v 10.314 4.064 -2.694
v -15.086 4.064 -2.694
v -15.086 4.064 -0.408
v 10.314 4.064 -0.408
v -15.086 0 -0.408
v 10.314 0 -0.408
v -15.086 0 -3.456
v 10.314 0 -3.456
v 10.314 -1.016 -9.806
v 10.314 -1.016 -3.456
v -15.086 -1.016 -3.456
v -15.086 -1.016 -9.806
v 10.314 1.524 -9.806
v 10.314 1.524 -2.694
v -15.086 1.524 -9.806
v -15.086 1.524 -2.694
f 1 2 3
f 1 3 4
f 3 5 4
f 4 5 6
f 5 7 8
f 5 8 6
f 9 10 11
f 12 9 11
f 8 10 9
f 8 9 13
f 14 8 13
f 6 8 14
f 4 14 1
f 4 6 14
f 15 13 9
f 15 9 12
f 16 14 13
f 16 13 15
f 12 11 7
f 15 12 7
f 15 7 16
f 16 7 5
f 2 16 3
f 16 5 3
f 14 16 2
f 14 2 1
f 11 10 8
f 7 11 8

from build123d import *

# Parameters (mm, degrees)
SKETCH1_W           = 25.4
SKETCH1_H           = 2.286
BOSS_EXTRUDE1_DEPTH = 4.064
SKETCH3_W           = 25.4
SKETCH3_H           = 2.54
BOSS_EXTRUDE3_DEPTH = 7.112
SKETCH4_W           = 0.762
SKETCH4_H           = 1.016
CUT_EXTRUDE1_DEPTH  = 30.734


with BuildPart() as part:
    # Sketch1 → Boss-Extrude1 (new body)
    with BuildSketch(Plane(origin=(0, 0, 0), x_dir=(1, 0, 0), z_dir=(0, 1, 0))):
        with Locations((-2.386060606, 1.550939394)):
            Rectangle(SKETCH1_W, SKETCH1_H)
    extrude(amount=BOSS_EXTRUDE1_DEPTH)

    # Sketch3 → Boss-Extrude3 (add)
    with BuildSketch(Plane(origin=(0, 0, -2.693939394), x_dir=(-1, 0, 0), z_dir=(0, 0, -1))):
        with Locations((2.386060606, 0.254)):
            Rectangle(SKETCH3_W, SKETCH3_H)
    extrude(amount=BOSS_EXTRUDE3_DEPTH)

    # Sketch4 → Cut-Extrude1 (cut)
    with BuildSketch(Plane.ZY.offset(15.086060606)):
        with Locations((-3.074939394, -0.508)):
            Rectangle(SKETCH4_W, SKETCH4_H)
    extrude(amount=-CUT_EXTRUDE1_DEPTH, mode=Mode.SUBTRACT)


solid = part.part
